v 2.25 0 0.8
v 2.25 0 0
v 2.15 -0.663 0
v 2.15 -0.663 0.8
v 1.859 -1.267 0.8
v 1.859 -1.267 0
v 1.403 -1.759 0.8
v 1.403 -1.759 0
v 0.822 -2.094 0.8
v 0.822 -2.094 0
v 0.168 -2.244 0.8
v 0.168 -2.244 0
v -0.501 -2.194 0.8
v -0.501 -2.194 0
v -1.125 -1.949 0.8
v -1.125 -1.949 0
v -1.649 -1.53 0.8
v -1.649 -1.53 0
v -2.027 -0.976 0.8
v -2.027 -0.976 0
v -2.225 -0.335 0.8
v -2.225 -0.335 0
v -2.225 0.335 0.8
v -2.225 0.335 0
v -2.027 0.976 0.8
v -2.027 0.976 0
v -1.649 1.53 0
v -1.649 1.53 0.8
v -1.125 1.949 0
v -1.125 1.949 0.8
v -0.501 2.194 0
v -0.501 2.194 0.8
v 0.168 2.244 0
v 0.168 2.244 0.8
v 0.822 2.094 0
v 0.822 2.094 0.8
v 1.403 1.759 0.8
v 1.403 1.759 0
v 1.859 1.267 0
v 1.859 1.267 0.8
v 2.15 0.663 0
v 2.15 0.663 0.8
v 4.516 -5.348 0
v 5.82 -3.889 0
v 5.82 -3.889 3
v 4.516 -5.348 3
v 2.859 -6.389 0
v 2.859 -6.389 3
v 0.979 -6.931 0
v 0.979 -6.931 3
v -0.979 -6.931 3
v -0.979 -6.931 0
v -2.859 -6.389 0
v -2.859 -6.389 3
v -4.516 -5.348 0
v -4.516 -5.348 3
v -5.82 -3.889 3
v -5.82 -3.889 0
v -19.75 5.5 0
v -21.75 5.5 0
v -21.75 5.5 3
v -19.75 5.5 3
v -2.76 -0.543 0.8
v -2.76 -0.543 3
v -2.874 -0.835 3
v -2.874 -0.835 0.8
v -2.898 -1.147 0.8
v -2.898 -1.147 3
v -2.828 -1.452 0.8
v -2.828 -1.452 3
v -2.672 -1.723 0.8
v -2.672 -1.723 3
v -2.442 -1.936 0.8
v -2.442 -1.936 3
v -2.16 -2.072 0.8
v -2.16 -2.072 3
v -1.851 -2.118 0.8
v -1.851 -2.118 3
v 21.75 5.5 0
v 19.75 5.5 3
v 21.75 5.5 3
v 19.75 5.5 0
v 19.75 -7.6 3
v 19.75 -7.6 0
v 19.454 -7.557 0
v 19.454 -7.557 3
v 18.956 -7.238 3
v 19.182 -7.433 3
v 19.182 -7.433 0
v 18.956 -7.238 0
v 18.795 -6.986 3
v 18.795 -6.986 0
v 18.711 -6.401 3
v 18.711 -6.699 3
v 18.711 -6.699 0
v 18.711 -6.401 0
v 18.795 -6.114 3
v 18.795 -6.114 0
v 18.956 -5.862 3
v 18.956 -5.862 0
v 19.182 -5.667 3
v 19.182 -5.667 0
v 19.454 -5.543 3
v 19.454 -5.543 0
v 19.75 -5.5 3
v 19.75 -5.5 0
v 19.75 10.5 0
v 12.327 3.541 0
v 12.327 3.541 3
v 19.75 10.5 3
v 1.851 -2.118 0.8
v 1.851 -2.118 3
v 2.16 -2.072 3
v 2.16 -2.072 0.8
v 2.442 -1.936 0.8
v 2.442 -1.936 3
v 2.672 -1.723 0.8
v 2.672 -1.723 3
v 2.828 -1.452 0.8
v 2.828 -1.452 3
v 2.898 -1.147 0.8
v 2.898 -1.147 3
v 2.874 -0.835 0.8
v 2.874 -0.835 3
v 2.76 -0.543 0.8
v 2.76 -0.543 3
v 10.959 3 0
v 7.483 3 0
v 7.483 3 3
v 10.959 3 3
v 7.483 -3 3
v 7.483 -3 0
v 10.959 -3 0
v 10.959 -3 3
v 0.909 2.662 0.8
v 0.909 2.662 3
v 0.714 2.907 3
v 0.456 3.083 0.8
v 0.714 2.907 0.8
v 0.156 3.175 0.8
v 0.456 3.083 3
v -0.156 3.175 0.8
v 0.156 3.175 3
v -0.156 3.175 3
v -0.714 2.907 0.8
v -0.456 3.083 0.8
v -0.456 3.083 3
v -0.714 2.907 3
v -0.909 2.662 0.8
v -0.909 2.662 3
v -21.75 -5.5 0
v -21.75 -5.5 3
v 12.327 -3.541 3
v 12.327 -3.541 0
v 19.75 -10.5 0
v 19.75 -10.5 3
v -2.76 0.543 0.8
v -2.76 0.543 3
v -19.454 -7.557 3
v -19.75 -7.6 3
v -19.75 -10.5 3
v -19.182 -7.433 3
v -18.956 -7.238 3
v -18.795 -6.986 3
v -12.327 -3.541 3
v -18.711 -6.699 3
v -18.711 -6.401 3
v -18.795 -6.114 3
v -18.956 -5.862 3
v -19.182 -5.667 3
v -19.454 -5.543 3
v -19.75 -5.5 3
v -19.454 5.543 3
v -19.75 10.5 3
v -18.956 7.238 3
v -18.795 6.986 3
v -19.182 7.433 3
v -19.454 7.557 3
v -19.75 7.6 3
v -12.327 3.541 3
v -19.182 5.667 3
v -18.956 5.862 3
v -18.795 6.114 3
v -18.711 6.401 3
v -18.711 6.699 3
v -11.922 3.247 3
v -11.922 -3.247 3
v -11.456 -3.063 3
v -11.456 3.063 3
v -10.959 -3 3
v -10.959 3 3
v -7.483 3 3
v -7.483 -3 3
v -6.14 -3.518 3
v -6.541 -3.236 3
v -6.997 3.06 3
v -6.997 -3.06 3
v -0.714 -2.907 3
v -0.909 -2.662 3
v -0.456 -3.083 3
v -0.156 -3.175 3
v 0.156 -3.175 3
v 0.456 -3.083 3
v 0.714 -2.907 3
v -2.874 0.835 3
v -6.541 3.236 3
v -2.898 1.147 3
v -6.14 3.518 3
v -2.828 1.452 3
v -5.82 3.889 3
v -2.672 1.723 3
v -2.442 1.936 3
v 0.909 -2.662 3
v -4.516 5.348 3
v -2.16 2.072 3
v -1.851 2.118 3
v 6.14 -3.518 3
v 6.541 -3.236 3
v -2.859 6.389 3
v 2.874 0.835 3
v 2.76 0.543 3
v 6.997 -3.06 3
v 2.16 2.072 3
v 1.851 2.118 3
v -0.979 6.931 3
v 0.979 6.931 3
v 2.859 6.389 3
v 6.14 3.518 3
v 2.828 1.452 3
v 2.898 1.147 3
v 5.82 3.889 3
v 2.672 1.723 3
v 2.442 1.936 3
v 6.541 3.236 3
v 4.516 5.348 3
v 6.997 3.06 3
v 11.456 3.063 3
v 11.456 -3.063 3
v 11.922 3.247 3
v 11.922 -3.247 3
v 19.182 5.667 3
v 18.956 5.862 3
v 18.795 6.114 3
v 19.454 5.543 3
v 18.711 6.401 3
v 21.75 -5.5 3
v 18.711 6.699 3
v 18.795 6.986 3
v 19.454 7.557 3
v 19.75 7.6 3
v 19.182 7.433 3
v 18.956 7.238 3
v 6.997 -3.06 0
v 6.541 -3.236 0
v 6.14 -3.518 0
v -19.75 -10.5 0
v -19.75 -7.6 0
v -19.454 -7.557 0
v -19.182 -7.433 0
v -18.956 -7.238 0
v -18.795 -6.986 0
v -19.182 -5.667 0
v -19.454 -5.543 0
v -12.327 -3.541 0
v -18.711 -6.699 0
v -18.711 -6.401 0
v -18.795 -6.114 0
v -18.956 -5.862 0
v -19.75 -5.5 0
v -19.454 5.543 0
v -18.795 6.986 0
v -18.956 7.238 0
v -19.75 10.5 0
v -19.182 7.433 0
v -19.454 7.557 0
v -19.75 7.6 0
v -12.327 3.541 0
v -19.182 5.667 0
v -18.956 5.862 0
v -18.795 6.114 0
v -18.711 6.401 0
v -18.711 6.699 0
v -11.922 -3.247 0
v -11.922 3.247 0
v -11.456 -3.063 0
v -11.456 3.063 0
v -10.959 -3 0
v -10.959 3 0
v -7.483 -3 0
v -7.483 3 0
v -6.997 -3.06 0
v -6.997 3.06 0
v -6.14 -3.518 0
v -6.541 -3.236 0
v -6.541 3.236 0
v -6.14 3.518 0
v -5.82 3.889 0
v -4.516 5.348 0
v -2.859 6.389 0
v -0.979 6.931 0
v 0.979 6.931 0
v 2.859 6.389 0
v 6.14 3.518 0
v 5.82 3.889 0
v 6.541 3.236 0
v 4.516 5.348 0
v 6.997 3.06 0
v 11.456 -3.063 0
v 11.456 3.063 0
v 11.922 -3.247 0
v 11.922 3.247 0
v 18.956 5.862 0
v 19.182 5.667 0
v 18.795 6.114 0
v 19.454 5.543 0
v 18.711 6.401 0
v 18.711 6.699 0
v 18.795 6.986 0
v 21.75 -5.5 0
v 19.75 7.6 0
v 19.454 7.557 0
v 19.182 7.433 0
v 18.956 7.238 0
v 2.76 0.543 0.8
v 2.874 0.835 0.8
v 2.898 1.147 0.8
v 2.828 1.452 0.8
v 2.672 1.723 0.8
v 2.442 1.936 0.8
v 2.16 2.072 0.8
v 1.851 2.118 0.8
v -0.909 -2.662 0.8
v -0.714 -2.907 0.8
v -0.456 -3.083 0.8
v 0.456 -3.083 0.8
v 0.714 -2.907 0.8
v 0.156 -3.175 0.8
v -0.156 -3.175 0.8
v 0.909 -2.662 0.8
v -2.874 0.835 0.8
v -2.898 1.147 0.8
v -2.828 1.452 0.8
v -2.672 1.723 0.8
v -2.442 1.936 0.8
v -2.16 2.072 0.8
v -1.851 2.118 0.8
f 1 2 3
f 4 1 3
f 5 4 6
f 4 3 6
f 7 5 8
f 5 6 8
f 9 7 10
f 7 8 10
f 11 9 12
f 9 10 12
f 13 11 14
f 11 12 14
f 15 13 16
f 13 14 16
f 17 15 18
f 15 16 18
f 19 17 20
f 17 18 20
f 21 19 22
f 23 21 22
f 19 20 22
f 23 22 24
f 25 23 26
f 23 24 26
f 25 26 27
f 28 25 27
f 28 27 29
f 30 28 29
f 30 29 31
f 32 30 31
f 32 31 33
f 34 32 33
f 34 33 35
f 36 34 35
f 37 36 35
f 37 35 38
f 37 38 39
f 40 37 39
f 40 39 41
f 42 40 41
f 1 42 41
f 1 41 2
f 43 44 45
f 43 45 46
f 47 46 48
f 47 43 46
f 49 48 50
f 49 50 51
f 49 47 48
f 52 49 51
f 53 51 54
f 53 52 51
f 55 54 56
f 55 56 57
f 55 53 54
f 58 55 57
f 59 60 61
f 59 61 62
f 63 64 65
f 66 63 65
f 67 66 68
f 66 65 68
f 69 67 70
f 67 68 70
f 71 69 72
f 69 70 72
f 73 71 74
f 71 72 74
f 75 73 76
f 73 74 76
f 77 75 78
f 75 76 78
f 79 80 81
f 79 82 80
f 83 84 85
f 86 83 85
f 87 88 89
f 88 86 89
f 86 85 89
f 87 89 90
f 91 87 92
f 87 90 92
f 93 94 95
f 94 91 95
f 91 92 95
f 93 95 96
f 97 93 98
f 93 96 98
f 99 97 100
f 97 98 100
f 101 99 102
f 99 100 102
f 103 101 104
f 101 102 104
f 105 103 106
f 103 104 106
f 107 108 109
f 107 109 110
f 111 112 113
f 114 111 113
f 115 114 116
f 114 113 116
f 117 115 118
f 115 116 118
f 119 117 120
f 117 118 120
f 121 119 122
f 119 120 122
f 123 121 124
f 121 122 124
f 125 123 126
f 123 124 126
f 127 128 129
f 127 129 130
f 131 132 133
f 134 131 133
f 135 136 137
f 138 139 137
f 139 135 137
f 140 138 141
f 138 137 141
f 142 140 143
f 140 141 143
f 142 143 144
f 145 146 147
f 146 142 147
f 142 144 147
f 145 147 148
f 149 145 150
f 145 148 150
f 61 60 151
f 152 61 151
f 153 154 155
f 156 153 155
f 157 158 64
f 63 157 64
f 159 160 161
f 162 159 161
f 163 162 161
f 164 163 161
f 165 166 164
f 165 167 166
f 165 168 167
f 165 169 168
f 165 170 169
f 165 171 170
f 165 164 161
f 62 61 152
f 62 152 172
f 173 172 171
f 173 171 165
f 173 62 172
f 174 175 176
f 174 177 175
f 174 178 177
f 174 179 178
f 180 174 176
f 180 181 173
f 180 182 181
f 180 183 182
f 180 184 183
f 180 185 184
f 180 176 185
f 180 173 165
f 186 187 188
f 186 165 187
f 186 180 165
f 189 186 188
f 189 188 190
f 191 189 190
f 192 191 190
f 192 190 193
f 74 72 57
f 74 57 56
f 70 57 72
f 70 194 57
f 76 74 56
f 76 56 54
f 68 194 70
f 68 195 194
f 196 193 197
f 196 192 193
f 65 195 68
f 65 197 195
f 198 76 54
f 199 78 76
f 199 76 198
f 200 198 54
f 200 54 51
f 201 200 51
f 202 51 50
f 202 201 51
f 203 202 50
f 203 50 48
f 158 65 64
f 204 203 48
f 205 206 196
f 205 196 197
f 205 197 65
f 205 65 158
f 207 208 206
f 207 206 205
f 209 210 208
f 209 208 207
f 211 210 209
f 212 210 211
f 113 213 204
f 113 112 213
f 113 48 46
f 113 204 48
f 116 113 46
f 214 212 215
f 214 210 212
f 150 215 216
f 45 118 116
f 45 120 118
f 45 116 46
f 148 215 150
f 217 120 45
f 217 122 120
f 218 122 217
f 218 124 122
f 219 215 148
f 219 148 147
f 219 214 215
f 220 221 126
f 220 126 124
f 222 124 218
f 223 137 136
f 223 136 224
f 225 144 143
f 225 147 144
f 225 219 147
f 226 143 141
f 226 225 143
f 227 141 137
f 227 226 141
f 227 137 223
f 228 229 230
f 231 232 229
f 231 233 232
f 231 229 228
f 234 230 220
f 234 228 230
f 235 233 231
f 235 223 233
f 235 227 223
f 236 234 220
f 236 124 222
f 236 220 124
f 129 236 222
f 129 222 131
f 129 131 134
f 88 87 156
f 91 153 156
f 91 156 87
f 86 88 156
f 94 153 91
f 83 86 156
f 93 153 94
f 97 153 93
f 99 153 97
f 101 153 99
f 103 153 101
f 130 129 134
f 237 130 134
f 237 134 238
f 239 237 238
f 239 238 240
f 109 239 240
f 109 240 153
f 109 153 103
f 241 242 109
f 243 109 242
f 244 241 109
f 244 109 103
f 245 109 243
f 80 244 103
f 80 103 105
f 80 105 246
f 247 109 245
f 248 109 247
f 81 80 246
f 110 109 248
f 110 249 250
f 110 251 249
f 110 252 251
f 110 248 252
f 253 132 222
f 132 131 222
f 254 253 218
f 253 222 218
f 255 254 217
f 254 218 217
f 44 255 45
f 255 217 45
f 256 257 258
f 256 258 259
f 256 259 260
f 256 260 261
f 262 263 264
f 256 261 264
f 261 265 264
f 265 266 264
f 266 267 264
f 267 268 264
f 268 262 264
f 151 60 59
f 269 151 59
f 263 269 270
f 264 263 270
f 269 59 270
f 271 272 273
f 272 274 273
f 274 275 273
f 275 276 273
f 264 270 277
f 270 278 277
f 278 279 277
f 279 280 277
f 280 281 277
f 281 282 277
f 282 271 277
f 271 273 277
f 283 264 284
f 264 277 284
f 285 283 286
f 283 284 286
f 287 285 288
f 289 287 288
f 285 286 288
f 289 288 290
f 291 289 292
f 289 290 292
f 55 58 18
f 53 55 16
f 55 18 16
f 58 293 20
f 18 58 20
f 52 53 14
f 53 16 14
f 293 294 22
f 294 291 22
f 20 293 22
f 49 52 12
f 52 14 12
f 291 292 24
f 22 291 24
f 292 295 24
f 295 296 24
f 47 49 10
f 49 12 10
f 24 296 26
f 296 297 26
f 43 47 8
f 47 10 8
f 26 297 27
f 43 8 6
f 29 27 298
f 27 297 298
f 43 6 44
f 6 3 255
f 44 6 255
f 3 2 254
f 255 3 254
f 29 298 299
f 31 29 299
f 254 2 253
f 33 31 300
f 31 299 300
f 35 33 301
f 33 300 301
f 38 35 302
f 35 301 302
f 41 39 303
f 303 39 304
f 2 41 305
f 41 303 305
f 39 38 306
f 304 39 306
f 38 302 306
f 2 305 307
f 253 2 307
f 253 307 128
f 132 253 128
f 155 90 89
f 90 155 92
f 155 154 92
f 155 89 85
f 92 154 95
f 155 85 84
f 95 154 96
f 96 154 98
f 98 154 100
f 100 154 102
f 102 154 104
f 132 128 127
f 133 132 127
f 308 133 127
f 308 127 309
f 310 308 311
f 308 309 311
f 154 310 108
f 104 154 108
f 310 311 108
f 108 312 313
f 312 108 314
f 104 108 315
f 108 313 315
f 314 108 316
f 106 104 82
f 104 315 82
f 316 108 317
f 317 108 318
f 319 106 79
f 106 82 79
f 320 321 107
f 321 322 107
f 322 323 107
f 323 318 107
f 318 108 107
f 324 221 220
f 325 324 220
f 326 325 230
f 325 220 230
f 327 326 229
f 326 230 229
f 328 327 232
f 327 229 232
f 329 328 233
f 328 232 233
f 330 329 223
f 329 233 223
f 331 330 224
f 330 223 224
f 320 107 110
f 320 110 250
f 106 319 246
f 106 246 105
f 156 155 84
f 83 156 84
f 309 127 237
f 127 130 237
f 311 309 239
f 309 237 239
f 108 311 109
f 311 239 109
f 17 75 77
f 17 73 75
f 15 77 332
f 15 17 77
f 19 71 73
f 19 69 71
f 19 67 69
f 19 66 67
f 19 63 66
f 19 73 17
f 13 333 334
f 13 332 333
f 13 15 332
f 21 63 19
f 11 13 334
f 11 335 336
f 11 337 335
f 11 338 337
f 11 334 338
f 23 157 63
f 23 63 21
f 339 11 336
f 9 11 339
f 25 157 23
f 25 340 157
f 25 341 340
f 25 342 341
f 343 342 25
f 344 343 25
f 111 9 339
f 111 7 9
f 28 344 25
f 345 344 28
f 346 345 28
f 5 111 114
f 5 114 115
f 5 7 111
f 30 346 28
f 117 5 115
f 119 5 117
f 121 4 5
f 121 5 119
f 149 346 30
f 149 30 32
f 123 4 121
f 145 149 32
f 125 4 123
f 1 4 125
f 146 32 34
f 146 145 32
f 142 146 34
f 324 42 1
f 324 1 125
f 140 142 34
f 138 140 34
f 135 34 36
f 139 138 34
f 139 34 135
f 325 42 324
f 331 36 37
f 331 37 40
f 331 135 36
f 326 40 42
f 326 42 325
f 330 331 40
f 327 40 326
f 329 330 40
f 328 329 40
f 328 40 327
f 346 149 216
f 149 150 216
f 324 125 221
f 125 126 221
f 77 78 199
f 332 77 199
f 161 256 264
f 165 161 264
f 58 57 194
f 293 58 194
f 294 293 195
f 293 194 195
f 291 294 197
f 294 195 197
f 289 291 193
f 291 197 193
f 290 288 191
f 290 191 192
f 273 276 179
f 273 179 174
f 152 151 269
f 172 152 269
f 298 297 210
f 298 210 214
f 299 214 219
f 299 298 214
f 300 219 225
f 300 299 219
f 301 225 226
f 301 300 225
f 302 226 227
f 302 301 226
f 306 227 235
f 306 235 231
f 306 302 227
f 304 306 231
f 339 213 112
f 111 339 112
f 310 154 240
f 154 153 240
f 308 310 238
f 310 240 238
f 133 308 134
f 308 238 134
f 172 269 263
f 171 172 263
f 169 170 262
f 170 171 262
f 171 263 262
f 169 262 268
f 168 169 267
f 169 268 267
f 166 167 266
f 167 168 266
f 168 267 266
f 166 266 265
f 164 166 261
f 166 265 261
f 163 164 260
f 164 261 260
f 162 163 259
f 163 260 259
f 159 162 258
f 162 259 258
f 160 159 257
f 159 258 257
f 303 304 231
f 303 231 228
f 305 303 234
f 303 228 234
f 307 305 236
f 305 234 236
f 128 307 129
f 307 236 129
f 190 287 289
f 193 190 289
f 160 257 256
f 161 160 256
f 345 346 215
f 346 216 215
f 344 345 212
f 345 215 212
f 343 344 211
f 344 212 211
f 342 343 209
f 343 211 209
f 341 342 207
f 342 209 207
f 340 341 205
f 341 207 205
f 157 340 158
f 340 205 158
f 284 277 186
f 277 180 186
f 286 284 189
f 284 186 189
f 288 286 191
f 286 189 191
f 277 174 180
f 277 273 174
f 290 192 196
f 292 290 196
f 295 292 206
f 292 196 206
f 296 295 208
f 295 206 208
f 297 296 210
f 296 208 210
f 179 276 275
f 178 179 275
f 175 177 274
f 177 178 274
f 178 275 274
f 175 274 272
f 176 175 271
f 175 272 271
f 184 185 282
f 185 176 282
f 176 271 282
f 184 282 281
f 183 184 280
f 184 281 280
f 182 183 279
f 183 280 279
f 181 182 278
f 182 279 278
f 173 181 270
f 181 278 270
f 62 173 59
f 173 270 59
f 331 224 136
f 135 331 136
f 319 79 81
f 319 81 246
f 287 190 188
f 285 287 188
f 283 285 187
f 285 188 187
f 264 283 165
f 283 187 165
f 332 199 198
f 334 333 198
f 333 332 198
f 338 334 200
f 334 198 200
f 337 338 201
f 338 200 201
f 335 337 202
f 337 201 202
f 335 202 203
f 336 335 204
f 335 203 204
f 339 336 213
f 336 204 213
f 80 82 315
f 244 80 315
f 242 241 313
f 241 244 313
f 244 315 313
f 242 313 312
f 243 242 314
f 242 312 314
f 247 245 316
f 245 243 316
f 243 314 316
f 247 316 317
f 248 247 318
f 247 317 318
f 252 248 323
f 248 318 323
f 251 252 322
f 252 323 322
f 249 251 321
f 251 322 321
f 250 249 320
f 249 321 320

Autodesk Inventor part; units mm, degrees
ref_plane "YZ Plane" through (0, 0, 0) normal (1, 0, 0) x (0, 1, 0)
ref_plane "XZ Plane" through (0, 0, 0) normal (0, 1, 0) x (-1, 0, 0)
ref_plane "XY Plane" through (0, 0, 0) normal (0, 0, 1) x (1, 0, 0)
sketch "スケッチ1" plane through (0, 0, 0) normal (0, 0, 1) x (1, 0, 0)
  line L0 (-21.75, 5.5) -> (-21.75, -5.5)
  line L1 (-21.75, -5.5) -> (-19.75, -5.5)
  line L2 (-21.75, 5.5) -> (-19.75, 5.5)
  line L3 (-19.75, 7.6) -> (-19.75, 10.5)
  line L4 (-19.75, 10.5) -> (19.75, 10.5)
  line L5 (19.75, 10.5) -> (19.75, 7.6)
  line L6 (-19.75, -7.6) -> (-19.75, -10.5)
  line L7 (-19.75, -10.5) -> (19.75, -10.5)
  line L8 (19.75, -10.5) -> (19.75, -7.6)
  line L9 (19.75, 5.5) -> (21.75, 5.5)
  line L10 (21.75, 5.5) -> (21.75, -5.5)
  line L11 (21.75, -5.5) -> (19.75, -5.5)
  line L12 (0, 0) -> (0, 10.5) construction
  line L13 (0, 0) -> (-21.75, 0) construction
  arc A0 (-19.75, 5.5) -> (-19.75, 7.6) centre (-19.75, 6.55) ccw
  arc A1 (-19.75, -7.6) -> (-19.75, -5.5) centre (-19.75, -6.55) ccw
  arc A2 (19.75, 7.6) -> (19.75, 5.5) centre (19.75, 6.55) ccw
  arc A3 (19.75, -5.5) -> (19.75, -7.6) centre (19.75, -6.55) ccw
  circle A4 centre (0, 0) radius 2.25
  dimension "d0" = 39.5
  dimension "d1" = 2
  dimension "d2" = 11
  dimension "d8" = 1.05
  dimension "d10" = 5
  dimension "d12" = 4.5
extrude "押し出し1" add sketch "スケッチ1" along normal blind 3
sketch "スケッチ2" plane through (0, 0, 0) normal (0, 0, -1) x (-1, 0, 0)
  circle A0 centre (0, 0) radius 2.25 projected
  line L0 (-19.75, 10.5) -> (19.75, 10.5) projected
  line L1 (-21.75, -5.5) -> (-21.75, 5.5) projected
  arc A1 (6.3246, 3) -> (-6.3246, 3) centre (0, 0) ccw
  line L2 (-6.3246, 3) -> (-11.75, 3)
  line L3 (-11.75, 3) -> (-23.9536, 14.4408)
  line L4 (-23.9536, 14.4408) -> (23.9536, 14.4408)
  line L5 (23.9536, 14.4408) -> (11.75, 3)
  line L6 (11.75, 3) -> (6.3246, 3)
  line L7 (-19.75, 10.5) -> (19.75, 10.5) construction
  line L8 (0, 10.5) -> (0, 0) construction
  line L9 (0, 0) -> (-21.75, 0) construction
  arc A2 (-6.3246, -3) -> (6.3246, -3) centre (0, 0) ccw
  line L10 (-6.3246, -3) -> (-11.75, -3)
  line L11 (-11.75, -3) -> (-23.9536, -14.4408)
  line L12 (-23.9536, -14.4408) -> (23.9536, -14.4408)
  line L13 (23.9536, -14.4408) -> (11.75, -3)
  line L14 (11.75, -3) -> (6.3246, -3)
  dimension "d17" = 7
  dimension "d19" = 3
  dimension "d38" = 8
extrude "押し出し2" cut sketch "スケッチ2" against normal blind 10 contours L3 L4 L5 L0 | L0 L5 L6 A1 L2 L3 | A2 L14 L13 L12 L11 L10
fillet "フィレット1" radius 2 8 edges at (6.3246, 3, 1.5) (-6.3246, 3, 1.5) (6.3246, -3, 1.5) (-6.3246, -3, 1.5) (11.75, -3, 1.5) (11.75, 3, 1.5) (-11.75, 3, 1.5) (-11.75, -3, 1.5)
sketch "スケッチ3" plane through (0, 0, 3) normal (0, 0, 1) x (1, 0, 0)
  circle A0 centre (0, 0) radius 2.25 projected
  line L0 (2.75, 1.5877) -> (2.75, -1.5877)
  line L1 (2.75, -1.5877) -> (0, -3.1754)
  line L2 (0, -3.1754) -> (-2.75, -1.5877)
  line L3 (-2.75, -1.5877) -> (-2.75, 1.5877)
  line L4 (-2.75, 1.5877) -> (0, 3.1754)
  line L5 (0, 3.1754) -> (2.75, 1.5877)
  line L6 (0, 3.187) -> (-2.76, 1.5935)
  line L7 (-2.76, 1.5935) -> (-2.76, -1.5935)
  line L8 (-2.76, -1.5935) -> (0, -3.187)
  line L9 (0, -3.187) -> (2.76, -1.5935)
  line L10 (2.76, -1.5935) -> (2.76, 1.5935)
  line L11 (2.76, 1.5935) -> (0, 3.187)
  circle A1 centre (0, 2.137) radius 1.05
  circle A2 centre (-1.8507, 1.0685) radius 1.05
  circle A3 centre (-1.8507, -1.0685) radius 1.05
  circle A4 centre (0, -2.137) radius 1.05
  circle A5 centre (1.8507, -1.0685) radius 1.05
  circle A6 centre (1.8507, 1.0685) radius 1.05
  point P0 (-2.76, 1.5935)
  point P1 (-2.76, -1.5935)
  point P2 (0, -3.187)
  point P3 (2.76, -1.5935)
  point P4 (2.76, 1.5935)
  dimension "d47" = 2.1
  dimension "d46" = 5.5
  dimension "d48" = 0.01
  dimension "d51" = 360
extrude "押し出し3" cut sketch "スケッチ3" against normal blind 2.2
equation "\"d2\" = d3"
equation "\"d10\" = d27"
equation "\"d3\" = 11"
equation "\"d27\" = 5"
properties part number "足首_サブフレーム_1_3" material "アルミニウム 2014-T4"
